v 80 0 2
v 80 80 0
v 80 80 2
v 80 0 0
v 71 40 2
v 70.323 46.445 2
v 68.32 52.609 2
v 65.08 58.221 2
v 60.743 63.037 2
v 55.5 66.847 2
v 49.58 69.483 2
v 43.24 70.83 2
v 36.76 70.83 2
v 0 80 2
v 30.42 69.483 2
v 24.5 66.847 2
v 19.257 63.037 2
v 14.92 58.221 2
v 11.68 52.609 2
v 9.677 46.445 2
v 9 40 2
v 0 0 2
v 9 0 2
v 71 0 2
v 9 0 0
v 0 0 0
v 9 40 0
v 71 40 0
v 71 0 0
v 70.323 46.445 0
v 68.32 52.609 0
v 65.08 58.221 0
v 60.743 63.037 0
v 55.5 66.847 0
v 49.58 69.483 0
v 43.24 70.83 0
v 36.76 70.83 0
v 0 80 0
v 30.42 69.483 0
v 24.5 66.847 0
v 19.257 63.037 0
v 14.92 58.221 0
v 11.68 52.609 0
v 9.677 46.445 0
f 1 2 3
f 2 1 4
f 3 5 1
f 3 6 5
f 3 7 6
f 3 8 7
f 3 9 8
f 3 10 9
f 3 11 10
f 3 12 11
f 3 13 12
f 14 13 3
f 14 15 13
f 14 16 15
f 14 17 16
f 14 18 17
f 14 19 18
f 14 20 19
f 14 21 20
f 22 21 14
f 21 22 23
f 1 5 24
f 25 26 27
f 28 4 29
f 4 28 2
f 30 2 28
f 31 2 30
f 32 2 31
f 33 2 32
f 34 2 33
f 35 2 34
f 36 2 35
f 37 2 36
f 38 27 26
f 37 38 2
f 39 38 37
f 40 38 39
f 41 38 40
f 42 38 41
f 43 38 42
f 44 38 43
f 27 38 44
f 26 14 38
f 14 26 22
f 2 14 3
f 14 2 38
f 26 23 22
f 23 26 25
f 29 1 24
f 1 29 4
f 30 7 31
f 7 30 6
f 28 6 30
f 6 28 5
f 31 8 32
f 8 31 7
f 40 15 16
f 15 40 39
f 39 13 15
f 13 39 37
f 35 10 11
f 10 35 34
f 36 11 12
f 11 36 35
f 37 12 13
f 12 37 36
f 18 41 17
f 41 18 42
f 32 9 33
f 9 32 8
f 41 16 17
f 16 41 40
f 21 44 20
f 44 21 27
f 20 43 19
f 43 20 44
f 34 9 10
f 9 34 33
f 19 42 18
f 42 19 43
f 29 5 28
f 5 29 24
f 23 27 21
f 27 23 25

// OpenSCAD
press_lip_od    = 83.3;
press_lip_depth = 4.6;

module hanger_arm(d, id, od) {
  difference() {
    cube([od, od, d]);

    translate([od/2, od/2, -1])
    cylinder(d=id, h=d+2);

    translate([(od-id)/2, 0, -1])
    cube([id, od/2, d+2]);
  }
}

hanger_arm(2, id=62, od=80);
